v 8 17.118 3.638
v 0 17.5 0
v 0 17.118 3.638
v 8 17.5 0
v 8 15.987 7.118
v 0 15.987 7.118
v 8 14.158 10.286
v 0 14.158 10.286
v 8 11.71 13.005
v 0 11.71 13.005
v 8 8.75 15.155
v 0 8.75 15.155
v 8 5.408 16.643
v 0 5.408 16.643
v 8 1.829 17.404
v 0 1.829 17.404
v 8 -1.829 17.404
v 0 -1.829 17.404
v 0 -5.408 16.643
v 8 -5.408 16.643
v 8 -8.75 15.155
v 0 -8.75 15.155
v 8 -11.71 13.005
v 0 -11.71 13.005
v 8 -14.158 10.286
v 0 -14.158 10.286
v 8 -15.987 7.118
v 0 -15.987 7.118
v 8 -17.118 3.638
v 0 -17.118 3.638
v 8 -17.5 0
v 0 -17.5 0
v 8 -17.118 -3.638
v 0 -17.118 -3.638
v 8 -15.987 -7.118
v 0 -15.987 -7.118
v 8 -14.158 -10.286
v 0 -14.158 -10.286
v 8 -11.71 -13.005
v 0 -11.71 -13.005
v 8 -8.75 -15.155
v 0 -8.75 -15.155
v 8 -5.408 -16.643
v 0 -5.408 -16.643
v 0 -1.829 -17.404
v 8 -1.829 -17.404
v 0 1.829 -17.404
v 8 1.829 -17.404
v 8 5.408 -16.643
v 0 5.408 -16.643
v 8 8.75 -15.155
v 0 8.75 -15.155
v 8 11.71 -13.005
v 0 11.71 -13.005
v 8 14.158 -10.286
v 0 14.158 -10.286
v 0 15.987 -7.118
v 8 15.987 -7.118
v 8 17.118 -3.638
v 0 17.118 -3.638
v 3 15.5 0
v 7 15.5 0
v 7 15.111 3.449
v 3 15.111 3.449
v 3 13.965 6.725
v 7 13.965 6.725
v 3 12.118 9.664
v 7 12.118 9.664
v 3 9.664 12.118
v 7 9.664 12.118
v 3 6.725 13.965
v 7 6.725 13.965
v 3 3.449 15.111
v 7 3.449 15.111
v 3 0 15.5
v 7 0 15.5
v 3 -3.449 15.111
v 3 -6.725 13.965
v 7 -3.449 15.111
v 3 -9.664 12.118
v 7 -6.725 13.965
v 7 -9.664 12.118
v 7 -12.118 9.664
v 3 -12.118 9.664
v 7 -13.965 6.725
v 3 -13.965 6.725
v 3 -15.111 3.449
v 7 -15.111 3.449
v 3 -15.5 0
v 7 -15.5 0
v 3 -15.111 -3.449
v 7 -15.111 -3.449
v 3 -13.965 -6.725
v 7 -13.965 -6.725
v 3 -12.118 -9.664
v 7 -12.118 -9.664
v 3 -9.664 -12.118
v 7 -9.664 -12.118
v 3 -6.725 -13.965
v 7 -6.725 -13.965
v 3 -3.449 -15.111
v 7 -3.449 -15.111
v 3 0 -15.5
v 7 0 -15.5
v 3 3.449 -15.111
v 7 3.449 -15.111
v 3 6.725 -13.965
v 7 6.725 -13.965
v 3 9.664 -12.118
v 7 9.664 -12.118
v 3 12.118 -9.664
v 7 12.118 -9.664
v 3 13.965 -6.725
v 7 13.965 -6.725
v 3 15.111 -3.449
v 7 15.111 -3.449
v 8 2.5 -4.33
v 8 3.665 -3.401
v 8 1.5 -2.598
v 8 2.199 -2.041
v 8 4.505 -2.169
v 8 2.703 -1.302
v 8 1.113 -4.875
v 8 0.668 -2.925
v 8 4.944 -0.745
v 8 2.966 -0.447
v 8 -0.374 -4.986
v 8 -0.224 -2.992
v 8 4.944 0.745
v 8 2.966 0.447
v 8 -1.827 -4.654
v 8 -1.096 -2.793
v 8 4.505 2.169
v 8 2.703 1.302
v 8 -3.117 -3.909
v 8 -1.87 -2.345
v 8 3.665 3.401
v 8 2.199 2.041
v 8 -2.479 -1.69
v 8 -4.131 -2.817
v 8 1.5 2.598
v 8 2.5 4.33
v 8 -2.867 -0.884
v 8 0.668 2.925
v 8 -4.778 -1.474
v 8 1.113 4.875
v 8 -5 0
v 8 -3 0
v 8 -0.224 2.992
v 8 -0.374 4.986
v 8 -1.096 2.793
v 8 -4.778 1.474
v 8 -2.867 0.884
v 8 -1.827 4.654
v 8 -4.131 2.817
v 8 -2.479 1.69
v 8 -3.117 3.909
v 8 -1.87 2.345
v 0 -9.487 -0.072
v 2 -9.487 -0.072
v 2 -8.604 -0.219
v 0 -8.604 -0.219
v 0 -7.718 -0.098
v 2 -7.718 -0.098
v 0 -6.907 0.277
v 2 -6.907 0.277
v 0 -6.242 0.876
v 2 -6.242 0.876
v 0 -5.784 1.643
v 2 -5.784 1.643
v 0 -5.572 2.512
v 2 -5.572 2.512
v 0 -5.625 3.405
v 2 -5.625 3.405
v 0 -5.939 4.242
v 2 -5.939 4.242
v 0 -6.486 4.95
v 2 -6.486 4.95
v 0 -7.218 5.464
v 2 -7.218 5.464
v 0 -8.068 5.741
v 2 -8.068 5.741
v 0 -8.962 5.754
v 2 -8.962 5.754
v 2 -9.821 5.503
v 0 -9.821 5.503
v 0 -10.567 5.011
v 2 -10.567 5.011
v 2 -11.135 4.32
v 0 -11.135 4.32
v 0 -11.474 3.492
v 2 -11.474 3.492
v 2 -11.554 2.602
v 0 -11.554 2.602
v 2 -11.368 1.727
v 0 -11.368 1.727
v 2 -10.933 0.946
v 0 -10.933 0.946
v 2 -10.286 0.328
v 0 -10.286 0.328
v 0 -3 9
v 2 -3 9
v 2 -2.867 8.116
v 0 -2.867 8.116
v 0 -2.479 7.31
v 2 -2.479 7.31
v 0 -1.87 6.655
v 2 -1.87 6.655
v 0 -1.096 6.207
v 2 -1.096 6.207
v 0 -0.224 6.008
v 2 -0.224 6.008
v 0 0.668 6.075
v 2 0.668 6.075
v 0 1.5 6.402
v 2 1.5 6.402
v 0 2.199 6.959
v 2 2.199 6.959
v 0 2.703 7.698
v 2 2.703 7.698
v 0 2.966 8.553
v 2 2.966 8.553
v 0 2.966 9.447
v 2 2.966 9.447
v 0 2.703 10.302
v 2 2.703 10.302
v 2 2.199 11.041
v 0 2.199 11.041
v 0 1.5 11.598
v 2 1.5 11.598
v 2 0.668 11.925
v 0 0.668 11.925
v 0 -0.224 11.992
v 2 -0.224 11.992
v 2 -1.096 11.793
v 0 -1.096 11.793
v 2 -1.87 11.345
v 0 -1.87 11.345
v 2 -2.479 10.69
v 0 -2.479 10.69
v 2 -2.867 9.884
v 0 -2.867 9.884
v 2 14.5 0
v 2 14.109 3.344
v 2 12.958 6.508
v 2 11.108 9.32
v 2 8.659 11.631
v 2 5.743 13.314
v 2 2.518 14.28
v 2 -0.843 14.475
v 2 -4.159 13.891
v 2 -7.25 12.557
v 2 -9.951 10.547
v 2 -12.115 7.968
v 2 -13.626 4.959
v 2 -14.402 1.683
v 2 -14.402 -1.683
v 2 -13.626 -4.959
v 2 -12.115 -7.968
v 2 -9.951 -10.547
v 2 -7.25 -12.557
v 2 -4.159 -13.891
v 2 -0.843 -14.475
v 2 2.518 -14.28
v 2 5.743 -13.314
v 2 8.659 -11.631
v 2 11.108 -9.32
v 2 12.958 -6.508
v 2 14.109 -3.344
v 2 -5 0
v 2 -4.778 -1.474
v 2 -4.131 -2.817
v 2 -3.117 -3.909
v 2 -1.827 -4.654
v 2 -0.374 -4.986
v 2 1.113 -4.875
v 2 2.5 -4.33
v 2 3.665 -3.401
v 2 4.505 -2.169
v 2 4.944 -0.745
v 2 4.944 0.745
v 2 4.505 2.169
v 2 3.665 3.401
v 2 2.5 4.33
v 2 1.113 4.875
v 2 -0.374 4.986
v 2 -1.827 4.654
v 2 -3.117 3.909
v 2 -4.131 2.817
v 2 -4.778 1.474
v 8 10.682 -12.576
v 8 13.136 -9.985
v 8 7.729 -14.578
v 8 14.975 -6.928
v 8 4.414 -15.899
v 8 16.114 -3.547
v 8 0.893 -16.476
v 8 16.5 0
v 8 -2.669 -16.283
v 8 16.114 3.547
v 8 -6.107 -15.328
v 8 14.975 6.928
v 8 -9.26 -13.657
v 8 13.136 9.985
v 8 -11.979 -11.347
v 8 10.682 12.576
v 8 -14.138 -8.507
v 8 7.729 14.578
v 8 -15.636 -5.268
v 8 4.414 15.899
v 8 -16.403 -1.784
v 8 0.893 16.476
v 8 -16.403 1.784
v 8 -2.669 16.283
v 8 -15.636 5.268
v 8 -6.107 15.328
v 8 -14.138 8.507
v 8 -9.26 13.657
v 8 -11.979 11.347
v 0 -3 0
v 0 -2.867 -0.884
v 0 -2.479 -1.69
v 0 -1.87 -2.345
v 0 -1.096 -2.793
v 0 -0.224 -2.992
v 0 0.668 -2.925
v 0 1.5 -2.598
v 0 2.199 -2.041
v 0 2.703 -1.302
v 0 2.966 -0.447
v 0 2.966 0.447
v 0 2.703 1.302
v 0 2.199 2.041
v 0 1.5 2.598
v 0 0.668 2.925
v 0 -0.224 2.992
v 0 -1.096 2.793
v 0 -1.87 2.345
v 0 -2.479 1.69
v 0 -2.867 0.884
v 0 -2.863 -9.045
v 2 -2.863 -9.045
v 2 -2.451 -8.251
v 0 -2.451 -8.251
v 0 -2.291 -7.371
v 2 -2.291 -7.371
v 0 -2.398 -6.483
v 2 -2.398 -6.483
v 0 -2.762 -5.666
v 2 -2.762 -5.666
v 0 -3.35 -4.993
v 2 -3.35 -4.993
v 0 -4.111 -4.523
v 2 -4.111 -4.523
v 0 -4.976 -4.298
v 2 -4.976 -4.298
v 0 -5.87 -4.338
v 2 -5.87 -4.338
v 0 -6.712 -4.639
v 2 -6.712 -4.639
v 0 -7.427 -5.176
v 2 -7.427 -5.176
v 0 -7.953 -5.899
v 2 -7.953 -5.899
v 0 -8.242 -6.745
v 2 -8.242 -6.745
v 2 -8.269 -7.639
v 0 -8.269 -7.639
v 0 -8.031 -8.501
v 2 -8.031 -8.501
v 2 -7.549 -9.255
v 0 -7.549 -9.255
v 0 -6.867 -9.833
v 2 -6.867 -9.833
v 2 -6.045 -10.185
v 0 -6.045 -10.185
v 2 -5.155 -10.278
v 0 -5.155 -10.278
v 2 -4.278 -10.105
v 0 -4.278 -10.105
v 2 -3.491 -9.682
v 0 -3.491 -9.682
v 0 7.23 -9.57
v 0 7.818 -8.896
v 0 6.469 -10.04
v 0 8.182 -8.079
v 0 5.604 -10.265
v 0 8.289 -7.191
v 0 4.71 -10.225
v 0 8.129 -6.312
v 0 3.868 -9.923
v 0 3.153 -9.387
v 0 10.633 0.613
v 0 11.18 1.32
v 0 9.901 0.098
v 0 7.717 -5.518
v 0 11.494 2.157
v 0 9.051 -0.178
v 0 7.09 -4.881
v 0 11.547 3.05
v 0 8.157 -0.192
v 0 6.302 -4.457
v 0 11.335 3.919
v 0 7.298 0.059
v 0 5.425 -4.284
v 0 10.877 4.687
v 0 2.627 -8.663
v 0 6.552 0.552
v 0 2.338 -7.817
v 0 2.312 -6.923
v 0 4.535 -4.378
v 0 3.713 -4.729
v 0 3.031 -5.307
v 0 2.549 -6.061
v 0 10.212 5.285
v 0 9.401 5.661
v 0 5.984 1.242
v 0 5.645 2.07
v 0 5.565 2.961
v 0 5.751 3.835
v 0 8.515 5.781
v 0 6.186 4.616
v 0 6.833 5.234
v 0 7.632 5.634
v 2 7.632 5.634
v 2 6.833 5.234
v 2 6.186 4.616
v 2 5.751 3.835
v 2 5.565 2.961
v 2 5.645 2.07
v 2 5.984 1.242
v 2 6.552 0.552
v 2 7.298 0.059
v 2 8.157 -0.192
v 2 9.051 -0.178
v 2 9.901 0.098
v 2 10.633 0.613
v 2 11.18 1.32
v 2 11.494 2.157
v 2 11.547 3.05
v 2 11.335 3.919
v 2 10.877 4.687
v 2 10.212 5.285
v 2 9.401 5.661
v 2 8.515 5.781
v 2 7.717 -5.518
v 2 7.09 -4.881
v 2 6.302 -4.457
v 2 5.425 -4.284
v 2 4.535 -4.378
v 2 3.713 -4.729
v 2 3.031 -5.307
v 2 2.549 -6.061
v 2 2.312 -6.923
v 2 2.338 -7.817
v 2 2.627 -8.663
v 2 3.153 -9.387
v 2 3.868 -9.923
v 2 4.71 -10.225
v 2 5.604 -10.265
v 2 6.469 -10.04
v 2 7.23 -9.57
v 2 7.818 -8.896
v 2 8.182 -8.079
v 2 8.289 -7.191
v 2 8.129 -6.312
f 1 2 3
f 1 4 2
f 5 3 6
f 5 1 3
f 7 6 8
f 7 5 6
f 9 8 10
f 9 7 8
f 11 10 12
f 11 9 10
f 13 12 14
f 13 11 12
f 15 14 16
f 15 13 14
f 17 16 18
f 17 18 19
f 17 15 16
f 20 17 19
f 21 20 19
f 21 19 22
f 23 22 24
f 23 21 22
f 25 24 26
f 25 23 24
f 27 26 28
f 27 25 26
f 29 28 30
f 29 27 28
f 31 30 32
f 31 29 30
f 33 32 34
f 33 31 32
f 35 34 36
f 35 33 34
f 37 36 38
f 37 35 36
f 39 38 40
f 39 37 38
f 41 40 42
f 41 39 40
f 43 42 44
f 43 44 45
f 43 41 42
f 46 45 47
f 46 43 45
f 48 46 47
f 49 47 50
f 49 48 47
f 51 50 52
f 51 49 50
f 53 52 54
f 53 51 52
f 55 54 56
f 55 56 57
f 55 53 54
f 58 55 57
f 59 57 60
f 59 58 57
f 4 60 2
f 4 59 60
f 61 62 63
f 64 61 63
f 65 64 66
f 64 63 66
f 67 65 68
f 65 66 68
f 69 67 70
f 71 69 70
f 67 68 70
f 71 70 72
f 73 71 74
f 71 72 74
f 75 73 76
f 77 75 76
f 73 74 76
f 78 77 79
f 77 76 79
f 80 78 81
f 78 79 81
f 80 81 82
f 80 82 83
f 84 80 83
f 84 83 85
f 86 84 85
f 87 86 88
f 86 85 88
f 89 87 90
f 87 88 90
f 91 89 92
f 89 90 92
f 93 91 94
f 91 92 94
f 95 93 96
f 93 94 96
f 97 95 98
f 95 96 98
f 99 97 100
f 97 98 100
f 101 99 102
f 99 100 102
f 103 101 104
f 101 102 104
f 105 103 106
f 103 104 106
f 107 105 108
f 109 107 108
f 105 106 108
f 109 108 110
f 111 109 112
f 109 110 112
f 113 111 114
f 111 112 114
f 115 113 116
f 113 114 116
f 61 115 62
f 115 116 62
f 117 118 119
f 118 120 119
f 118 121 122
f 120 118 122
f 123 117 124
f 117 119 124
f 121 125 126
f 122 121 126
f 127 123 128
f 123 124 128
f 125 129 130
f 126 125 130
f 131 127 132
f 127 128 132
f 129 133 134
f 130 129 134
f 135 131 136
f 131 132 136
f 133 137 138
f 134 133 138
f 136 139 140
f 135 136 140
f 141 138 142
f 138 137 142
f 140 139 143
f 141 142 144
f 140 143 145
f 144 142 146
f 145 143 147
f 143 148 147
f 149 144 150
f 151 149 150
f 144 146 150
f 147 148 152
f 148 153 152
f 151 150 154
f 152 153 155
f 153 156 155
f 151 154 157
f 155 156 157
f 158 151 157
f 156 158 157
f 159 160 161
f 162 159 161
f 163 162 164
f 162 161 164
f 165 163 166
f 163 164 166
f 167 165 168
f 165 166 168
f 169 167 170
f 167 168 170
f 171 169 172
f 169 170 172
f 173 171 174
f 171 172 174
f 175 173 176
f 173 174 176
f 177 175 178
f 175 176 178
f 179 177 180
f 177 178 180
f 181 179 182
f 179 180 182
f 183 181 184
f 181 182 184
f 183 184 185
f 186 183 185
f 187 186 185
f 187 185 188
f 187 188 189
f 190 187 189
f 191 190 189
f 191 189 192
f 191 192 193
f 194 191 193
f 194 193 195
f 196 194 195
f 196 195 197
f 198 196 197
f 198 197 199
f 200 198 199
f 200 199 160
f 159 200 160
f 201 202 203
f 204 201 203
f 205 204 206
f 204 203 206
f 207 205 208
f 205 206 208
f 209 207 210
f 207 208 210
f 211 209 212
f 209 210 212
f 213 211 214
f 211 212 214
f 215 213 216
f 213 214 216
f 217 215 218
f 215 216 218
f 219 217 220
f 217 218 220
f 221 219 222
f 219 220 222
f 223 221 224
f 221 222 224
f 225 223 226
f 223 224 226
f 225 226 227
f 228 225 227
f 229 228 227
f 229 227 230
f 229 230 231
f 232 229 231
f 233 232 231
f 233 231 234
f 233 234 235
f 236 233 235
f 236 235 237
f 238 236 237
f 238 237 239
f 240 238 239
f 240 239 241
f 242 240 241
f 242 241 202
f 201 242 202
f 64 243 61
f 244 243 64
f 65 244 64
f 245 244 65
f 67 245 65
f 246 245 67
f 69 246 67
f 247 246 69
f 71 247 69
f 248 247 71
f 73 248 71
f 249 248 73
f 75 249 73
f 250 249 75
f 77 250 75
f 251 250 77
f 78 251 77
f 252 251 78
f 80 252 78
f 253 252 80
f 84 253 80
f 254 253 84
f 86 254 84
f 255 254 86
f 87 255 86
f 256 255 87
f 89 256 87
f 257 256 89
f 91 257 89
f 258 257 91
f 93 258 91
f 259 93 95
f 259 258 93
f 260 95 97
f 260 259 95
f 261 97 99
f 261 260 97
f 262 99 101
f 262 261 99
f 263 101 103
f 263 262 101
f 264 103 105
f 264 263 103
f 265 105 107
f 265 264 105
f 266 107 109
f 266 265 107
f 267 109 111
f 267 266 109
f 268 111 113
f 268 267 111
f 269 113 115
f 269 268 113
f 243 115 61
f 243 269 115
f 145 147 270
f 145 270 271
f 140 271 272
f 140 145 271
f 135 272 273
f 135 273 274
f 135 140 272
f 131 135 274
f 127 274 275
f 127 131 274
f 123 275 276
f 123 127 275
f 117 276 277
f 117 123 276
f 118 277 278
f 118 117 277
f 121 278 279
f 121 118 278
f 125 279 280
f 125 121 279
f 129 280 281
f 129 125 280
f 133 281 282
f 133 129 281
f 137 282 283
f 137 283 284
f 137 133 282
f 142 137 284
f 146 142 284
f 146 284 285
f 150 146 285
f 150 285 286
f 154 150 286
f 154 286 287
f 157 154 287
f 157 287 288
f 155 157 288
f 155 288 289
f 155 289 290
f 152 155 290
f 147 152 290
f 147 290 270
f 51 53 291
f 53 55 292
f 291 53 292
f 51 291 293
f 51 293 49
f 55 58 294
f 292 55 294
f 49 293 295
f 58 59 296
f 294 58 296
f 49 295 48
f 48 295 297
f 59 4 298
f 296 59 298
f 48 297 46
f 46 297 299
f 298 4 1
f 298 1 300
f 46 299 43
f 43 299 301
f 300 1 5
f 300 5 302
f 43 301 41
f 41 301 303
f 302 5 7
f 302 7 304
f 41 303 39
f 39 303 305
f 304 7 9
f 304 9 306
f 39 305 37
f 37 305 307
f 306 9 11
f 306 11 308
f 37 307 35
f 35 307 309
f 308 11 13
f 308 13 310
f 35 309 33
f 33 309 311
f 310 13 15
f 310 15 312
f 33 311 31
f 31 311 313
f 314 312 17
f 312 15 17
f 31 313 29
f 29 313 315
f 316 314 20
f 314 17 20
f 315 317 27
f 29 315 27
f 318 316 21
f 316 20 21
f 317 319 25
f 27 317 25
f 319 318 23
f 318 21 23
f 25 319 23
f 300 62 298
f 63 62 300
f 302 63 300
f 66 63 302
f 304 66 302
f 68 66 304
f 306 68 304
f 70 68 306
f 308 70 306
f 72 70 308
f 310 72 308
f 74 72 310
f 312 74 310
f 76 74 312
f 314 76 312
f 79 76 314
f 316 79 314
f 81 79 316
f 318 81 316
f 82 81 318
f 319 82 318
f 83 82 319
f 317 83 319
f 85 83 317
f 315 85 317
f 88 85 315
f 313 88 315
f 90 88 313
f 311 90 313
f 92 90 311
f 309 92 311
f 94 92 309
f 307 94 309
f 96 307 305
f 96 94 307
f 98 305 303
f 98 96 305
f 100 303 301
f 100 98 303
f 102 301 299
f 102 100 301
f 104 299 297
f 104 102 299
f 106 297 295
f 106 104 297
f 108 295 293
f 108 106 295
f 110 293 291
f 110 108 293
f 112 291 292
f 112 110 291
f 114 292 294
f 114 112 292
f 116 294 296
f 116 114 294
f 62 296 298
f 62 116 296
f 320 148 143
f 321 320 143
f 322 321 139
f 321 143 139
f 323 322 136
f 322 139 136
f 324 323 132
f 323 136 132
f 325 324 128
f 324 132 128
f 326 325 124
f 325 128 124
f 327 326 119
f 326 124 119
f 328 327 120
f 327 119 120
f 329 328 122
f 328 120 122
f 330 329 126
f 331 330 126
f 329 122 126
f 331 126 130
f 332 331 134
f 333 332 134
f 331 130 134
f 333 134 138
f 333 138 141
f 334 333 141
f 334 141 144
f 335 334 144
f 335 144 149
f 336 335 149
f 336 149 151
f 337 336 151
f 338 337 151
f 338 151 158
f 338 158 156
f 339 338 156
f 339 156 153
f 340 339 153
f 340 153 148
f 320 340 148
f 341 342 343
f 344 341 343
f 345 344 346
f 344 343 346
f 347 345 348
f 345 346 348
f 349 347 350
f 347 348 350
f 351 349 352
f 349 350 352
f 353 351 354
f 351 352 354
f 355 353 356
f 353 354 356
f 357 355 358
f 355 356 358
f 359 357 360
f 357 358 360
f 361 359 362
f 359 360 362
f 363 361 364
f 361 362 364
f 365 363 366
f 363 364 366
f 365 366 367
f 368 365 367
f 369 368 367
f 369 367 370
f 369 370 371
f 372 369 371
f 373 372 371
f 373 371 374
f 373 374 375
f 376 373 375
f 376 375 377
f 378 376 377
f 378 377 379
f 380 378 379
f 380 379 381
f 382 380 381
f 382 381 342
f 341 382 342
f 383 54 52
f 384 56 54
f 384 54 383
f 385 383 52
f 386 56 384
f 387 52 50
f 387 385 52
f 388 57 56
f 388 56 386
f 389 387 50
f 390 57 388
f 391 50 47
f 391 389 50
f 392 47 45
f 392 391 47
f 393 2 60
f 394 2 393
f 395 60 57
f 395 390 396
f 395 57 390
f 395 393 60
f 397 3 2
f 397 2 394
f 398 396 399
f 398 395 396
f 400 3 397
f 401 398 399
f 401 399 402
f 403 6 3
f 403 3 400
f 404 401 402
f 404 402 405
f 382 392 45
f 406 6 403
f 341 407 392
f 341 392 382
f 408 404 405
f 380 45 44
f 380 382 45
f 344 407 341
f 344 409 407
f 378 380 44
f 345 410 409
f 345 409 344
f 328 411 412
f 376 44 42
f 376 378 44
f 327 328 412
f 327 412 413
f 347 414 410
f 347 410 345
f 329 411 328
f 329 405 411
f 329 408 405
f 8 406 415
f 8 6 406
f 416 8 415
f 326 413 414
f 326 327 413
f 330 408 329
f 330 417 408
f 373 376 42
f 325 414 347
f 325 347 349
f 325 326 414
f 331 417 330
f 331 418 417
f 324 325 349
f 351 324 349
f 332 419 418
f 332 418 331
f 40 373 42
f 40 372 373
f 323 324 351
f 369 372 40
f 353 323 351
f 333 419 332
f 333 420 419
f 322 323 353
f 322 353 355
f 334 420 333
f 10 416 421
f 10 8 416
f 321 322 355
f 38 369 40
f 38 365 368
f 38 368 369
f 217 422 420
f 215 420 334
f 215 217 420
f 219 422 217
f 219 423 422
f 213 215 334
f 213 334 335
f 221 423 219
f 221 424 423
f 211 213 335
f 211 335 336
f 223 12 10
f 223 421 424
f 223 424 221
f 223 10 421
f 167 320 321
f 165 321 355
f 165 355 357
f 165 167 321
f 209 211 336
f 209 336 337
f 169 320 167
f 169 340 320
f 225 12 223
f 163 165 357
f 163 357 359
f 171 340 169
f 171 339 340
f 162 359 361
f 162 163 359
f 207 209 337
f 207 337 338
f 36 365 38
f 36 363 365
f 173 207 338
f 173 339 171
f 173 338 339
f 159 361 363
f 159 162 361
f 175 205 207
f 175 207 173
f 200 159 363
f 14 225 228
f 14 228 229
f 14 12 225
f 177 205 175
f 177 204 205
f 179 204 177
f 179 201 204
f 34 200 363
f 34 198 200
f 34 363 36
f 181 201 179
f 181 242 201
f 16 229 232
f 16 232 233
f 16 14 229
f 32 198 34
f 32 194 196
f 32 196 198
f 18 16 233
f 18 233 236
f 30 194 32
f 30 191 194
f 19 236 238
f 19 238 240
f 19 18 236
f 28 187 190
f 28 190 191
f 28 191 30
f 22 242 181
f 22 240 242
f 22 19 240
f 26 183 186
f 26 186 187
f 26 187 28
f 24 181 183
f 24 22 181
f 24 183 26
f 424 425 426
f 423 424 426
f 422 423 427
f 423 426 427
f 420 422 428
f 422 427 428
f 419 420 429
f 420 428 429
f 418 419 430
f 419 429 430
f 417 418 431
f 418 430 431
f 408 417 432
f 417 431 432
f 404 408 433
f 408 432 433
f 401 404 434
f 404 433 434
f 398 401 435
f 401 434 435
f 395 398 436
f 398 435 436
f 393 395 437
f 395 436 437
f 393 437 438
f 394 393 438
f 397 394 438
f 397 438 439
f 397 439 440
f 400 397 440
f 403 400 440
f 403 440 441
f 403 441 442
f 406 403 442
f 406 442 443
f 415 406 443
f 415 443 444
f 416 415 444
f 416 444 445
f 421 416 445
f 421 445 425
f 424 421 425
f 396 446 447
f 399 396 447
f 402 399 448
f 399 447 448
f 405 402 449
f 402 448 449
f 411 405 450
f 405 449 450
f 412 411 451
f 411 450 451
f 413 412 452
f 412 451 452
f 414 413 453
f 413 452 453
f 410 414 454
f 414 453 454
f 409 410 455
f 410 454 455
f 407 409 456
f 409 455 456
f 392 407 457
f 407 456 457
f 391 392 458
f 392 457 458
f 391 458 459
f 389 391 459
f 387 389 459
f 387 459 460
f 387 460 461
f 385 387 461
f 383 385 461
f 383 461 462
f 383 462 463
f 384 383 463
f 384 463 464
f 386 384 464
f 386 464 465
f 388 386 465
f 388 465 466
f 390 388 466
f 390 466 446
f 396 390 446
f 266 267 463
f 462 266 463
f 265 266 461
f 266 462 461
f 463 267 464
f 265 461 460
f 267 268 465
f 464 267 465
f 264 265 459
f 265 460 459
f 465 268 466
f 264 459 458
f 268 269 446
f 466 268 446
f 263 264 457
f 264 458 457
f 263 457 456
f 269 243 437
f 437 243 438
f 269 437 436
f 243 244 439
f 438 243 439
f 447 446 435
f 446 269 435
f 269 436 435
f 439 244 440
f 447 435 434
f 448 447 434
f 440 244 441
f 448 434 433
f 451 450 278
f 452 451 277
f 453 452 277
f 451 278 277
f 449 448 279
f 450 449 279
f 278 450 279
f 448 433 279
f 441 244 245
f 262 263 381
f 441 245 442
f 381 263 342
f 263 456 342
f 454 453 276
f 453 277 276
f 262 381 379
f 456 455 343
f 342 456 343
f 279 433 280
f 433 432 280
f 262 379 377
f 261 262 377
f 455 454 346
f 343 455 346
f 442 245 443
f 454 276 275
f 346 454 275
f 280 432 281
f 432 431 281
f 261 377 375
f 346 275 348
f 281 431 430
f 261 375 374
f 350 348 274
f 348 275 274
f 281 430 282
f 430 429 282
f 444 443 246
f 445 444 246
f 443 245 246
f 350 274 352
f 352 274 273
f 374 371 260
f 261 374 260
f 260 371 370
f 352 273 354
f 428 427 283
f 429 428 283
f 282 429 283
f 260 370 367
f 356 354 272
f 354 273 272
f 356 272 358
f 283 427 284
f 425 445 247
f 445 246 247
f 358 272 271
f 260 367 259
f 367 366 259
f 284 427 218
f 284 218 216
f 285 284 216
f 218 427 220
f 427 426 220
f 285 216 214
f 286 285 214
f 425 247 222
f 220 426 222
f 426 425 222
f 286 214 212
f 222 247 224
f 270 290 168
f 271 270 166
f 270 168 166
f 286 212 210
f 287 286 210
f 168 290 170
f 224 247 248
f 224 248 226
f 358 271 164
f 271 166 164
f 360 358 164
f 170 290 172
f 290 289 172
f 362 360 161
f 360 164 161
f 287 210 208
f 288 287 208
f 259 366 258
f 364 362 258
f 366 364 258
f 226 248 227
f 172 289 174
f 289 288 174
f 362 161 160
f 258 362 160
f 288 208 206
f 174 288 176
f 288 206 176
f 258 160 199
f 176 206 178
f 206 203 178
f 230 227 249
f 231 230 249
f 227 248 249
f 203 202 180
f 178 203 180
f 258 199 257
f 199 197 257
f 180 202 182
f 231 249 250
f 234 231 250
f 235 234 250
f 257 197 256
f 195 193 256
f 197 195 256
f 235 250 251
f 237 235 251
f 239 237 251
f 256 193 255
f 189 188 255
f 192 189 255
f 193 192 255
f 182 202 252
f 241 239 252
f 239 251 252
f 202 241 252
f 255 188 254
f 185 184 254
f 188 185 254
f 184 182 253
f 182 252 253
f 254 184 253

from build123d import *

# Parameters (mm, degrees)
F0_W            = 8
F0_H            = 17.5
F3_D            = 6
F4_T            = -2
F5_SIZE         = 1
F7_D            = 6
F7_COPIES_COUNT = 5


# Not quite as in the source:
# - a pattern or mirror of a feature is missing from the dataset's text; its kind, count and spacing are read off the source's solid


with BuildPart() as f1:
    # F0 (on Top) → F1 (revolve)
    with BuildSketch(Plane.XY):
        with Locations((4, 8.75)):
            Rectangle(F0_W, F0_H)
    revolve(axis=Axis((4, 0, 0), (1, 0, 0)))

    # F3 (through all)
    with Locations(Plane(origin=(0, 0, 0), x_dir=(0, 1, 0), z_dir=(-1, 0, 0))):
        with Locations((0, 0)):
            Hole(F3_D / 2)

    # F4
    f4_openings = [f1.faces().sort_by_distance(p)[0] for p in [
        (8, -17.005025, 0),
    ]]
    offset(amount=F4_T, openings=f4_openings)

    # F5
    f5_edges = [f1.edges().sort_by_distance(p)[0] for p in [
        (8, -15.5, 0),
        (5, 15.5, 0),
        (2, -15.5, 0),
    ]]
    chamfer(f5_edges, length=F5_SIZE)

    # F7 (through all)
    with Locations(Plane(origin=(0, 0, 0), x_dir=(0, 1, 0), z_dir=(-1, 0, 0))):
        with Locations((0, -9)):
            f7 = Hole(F7_D / 2)

    # F7_copies: F7 ×5 about axis
    f7_copies_axis = Axis((0, 0, 0), (1, 0, 0))
    for i in range(1, F7_COPIES_COUNT):
        add(f7.rotate(f7_copies_axis, i * 360 / F7_COPIES_COUNT), mode=Mode.SUBTRACT)


solid = f1.part
